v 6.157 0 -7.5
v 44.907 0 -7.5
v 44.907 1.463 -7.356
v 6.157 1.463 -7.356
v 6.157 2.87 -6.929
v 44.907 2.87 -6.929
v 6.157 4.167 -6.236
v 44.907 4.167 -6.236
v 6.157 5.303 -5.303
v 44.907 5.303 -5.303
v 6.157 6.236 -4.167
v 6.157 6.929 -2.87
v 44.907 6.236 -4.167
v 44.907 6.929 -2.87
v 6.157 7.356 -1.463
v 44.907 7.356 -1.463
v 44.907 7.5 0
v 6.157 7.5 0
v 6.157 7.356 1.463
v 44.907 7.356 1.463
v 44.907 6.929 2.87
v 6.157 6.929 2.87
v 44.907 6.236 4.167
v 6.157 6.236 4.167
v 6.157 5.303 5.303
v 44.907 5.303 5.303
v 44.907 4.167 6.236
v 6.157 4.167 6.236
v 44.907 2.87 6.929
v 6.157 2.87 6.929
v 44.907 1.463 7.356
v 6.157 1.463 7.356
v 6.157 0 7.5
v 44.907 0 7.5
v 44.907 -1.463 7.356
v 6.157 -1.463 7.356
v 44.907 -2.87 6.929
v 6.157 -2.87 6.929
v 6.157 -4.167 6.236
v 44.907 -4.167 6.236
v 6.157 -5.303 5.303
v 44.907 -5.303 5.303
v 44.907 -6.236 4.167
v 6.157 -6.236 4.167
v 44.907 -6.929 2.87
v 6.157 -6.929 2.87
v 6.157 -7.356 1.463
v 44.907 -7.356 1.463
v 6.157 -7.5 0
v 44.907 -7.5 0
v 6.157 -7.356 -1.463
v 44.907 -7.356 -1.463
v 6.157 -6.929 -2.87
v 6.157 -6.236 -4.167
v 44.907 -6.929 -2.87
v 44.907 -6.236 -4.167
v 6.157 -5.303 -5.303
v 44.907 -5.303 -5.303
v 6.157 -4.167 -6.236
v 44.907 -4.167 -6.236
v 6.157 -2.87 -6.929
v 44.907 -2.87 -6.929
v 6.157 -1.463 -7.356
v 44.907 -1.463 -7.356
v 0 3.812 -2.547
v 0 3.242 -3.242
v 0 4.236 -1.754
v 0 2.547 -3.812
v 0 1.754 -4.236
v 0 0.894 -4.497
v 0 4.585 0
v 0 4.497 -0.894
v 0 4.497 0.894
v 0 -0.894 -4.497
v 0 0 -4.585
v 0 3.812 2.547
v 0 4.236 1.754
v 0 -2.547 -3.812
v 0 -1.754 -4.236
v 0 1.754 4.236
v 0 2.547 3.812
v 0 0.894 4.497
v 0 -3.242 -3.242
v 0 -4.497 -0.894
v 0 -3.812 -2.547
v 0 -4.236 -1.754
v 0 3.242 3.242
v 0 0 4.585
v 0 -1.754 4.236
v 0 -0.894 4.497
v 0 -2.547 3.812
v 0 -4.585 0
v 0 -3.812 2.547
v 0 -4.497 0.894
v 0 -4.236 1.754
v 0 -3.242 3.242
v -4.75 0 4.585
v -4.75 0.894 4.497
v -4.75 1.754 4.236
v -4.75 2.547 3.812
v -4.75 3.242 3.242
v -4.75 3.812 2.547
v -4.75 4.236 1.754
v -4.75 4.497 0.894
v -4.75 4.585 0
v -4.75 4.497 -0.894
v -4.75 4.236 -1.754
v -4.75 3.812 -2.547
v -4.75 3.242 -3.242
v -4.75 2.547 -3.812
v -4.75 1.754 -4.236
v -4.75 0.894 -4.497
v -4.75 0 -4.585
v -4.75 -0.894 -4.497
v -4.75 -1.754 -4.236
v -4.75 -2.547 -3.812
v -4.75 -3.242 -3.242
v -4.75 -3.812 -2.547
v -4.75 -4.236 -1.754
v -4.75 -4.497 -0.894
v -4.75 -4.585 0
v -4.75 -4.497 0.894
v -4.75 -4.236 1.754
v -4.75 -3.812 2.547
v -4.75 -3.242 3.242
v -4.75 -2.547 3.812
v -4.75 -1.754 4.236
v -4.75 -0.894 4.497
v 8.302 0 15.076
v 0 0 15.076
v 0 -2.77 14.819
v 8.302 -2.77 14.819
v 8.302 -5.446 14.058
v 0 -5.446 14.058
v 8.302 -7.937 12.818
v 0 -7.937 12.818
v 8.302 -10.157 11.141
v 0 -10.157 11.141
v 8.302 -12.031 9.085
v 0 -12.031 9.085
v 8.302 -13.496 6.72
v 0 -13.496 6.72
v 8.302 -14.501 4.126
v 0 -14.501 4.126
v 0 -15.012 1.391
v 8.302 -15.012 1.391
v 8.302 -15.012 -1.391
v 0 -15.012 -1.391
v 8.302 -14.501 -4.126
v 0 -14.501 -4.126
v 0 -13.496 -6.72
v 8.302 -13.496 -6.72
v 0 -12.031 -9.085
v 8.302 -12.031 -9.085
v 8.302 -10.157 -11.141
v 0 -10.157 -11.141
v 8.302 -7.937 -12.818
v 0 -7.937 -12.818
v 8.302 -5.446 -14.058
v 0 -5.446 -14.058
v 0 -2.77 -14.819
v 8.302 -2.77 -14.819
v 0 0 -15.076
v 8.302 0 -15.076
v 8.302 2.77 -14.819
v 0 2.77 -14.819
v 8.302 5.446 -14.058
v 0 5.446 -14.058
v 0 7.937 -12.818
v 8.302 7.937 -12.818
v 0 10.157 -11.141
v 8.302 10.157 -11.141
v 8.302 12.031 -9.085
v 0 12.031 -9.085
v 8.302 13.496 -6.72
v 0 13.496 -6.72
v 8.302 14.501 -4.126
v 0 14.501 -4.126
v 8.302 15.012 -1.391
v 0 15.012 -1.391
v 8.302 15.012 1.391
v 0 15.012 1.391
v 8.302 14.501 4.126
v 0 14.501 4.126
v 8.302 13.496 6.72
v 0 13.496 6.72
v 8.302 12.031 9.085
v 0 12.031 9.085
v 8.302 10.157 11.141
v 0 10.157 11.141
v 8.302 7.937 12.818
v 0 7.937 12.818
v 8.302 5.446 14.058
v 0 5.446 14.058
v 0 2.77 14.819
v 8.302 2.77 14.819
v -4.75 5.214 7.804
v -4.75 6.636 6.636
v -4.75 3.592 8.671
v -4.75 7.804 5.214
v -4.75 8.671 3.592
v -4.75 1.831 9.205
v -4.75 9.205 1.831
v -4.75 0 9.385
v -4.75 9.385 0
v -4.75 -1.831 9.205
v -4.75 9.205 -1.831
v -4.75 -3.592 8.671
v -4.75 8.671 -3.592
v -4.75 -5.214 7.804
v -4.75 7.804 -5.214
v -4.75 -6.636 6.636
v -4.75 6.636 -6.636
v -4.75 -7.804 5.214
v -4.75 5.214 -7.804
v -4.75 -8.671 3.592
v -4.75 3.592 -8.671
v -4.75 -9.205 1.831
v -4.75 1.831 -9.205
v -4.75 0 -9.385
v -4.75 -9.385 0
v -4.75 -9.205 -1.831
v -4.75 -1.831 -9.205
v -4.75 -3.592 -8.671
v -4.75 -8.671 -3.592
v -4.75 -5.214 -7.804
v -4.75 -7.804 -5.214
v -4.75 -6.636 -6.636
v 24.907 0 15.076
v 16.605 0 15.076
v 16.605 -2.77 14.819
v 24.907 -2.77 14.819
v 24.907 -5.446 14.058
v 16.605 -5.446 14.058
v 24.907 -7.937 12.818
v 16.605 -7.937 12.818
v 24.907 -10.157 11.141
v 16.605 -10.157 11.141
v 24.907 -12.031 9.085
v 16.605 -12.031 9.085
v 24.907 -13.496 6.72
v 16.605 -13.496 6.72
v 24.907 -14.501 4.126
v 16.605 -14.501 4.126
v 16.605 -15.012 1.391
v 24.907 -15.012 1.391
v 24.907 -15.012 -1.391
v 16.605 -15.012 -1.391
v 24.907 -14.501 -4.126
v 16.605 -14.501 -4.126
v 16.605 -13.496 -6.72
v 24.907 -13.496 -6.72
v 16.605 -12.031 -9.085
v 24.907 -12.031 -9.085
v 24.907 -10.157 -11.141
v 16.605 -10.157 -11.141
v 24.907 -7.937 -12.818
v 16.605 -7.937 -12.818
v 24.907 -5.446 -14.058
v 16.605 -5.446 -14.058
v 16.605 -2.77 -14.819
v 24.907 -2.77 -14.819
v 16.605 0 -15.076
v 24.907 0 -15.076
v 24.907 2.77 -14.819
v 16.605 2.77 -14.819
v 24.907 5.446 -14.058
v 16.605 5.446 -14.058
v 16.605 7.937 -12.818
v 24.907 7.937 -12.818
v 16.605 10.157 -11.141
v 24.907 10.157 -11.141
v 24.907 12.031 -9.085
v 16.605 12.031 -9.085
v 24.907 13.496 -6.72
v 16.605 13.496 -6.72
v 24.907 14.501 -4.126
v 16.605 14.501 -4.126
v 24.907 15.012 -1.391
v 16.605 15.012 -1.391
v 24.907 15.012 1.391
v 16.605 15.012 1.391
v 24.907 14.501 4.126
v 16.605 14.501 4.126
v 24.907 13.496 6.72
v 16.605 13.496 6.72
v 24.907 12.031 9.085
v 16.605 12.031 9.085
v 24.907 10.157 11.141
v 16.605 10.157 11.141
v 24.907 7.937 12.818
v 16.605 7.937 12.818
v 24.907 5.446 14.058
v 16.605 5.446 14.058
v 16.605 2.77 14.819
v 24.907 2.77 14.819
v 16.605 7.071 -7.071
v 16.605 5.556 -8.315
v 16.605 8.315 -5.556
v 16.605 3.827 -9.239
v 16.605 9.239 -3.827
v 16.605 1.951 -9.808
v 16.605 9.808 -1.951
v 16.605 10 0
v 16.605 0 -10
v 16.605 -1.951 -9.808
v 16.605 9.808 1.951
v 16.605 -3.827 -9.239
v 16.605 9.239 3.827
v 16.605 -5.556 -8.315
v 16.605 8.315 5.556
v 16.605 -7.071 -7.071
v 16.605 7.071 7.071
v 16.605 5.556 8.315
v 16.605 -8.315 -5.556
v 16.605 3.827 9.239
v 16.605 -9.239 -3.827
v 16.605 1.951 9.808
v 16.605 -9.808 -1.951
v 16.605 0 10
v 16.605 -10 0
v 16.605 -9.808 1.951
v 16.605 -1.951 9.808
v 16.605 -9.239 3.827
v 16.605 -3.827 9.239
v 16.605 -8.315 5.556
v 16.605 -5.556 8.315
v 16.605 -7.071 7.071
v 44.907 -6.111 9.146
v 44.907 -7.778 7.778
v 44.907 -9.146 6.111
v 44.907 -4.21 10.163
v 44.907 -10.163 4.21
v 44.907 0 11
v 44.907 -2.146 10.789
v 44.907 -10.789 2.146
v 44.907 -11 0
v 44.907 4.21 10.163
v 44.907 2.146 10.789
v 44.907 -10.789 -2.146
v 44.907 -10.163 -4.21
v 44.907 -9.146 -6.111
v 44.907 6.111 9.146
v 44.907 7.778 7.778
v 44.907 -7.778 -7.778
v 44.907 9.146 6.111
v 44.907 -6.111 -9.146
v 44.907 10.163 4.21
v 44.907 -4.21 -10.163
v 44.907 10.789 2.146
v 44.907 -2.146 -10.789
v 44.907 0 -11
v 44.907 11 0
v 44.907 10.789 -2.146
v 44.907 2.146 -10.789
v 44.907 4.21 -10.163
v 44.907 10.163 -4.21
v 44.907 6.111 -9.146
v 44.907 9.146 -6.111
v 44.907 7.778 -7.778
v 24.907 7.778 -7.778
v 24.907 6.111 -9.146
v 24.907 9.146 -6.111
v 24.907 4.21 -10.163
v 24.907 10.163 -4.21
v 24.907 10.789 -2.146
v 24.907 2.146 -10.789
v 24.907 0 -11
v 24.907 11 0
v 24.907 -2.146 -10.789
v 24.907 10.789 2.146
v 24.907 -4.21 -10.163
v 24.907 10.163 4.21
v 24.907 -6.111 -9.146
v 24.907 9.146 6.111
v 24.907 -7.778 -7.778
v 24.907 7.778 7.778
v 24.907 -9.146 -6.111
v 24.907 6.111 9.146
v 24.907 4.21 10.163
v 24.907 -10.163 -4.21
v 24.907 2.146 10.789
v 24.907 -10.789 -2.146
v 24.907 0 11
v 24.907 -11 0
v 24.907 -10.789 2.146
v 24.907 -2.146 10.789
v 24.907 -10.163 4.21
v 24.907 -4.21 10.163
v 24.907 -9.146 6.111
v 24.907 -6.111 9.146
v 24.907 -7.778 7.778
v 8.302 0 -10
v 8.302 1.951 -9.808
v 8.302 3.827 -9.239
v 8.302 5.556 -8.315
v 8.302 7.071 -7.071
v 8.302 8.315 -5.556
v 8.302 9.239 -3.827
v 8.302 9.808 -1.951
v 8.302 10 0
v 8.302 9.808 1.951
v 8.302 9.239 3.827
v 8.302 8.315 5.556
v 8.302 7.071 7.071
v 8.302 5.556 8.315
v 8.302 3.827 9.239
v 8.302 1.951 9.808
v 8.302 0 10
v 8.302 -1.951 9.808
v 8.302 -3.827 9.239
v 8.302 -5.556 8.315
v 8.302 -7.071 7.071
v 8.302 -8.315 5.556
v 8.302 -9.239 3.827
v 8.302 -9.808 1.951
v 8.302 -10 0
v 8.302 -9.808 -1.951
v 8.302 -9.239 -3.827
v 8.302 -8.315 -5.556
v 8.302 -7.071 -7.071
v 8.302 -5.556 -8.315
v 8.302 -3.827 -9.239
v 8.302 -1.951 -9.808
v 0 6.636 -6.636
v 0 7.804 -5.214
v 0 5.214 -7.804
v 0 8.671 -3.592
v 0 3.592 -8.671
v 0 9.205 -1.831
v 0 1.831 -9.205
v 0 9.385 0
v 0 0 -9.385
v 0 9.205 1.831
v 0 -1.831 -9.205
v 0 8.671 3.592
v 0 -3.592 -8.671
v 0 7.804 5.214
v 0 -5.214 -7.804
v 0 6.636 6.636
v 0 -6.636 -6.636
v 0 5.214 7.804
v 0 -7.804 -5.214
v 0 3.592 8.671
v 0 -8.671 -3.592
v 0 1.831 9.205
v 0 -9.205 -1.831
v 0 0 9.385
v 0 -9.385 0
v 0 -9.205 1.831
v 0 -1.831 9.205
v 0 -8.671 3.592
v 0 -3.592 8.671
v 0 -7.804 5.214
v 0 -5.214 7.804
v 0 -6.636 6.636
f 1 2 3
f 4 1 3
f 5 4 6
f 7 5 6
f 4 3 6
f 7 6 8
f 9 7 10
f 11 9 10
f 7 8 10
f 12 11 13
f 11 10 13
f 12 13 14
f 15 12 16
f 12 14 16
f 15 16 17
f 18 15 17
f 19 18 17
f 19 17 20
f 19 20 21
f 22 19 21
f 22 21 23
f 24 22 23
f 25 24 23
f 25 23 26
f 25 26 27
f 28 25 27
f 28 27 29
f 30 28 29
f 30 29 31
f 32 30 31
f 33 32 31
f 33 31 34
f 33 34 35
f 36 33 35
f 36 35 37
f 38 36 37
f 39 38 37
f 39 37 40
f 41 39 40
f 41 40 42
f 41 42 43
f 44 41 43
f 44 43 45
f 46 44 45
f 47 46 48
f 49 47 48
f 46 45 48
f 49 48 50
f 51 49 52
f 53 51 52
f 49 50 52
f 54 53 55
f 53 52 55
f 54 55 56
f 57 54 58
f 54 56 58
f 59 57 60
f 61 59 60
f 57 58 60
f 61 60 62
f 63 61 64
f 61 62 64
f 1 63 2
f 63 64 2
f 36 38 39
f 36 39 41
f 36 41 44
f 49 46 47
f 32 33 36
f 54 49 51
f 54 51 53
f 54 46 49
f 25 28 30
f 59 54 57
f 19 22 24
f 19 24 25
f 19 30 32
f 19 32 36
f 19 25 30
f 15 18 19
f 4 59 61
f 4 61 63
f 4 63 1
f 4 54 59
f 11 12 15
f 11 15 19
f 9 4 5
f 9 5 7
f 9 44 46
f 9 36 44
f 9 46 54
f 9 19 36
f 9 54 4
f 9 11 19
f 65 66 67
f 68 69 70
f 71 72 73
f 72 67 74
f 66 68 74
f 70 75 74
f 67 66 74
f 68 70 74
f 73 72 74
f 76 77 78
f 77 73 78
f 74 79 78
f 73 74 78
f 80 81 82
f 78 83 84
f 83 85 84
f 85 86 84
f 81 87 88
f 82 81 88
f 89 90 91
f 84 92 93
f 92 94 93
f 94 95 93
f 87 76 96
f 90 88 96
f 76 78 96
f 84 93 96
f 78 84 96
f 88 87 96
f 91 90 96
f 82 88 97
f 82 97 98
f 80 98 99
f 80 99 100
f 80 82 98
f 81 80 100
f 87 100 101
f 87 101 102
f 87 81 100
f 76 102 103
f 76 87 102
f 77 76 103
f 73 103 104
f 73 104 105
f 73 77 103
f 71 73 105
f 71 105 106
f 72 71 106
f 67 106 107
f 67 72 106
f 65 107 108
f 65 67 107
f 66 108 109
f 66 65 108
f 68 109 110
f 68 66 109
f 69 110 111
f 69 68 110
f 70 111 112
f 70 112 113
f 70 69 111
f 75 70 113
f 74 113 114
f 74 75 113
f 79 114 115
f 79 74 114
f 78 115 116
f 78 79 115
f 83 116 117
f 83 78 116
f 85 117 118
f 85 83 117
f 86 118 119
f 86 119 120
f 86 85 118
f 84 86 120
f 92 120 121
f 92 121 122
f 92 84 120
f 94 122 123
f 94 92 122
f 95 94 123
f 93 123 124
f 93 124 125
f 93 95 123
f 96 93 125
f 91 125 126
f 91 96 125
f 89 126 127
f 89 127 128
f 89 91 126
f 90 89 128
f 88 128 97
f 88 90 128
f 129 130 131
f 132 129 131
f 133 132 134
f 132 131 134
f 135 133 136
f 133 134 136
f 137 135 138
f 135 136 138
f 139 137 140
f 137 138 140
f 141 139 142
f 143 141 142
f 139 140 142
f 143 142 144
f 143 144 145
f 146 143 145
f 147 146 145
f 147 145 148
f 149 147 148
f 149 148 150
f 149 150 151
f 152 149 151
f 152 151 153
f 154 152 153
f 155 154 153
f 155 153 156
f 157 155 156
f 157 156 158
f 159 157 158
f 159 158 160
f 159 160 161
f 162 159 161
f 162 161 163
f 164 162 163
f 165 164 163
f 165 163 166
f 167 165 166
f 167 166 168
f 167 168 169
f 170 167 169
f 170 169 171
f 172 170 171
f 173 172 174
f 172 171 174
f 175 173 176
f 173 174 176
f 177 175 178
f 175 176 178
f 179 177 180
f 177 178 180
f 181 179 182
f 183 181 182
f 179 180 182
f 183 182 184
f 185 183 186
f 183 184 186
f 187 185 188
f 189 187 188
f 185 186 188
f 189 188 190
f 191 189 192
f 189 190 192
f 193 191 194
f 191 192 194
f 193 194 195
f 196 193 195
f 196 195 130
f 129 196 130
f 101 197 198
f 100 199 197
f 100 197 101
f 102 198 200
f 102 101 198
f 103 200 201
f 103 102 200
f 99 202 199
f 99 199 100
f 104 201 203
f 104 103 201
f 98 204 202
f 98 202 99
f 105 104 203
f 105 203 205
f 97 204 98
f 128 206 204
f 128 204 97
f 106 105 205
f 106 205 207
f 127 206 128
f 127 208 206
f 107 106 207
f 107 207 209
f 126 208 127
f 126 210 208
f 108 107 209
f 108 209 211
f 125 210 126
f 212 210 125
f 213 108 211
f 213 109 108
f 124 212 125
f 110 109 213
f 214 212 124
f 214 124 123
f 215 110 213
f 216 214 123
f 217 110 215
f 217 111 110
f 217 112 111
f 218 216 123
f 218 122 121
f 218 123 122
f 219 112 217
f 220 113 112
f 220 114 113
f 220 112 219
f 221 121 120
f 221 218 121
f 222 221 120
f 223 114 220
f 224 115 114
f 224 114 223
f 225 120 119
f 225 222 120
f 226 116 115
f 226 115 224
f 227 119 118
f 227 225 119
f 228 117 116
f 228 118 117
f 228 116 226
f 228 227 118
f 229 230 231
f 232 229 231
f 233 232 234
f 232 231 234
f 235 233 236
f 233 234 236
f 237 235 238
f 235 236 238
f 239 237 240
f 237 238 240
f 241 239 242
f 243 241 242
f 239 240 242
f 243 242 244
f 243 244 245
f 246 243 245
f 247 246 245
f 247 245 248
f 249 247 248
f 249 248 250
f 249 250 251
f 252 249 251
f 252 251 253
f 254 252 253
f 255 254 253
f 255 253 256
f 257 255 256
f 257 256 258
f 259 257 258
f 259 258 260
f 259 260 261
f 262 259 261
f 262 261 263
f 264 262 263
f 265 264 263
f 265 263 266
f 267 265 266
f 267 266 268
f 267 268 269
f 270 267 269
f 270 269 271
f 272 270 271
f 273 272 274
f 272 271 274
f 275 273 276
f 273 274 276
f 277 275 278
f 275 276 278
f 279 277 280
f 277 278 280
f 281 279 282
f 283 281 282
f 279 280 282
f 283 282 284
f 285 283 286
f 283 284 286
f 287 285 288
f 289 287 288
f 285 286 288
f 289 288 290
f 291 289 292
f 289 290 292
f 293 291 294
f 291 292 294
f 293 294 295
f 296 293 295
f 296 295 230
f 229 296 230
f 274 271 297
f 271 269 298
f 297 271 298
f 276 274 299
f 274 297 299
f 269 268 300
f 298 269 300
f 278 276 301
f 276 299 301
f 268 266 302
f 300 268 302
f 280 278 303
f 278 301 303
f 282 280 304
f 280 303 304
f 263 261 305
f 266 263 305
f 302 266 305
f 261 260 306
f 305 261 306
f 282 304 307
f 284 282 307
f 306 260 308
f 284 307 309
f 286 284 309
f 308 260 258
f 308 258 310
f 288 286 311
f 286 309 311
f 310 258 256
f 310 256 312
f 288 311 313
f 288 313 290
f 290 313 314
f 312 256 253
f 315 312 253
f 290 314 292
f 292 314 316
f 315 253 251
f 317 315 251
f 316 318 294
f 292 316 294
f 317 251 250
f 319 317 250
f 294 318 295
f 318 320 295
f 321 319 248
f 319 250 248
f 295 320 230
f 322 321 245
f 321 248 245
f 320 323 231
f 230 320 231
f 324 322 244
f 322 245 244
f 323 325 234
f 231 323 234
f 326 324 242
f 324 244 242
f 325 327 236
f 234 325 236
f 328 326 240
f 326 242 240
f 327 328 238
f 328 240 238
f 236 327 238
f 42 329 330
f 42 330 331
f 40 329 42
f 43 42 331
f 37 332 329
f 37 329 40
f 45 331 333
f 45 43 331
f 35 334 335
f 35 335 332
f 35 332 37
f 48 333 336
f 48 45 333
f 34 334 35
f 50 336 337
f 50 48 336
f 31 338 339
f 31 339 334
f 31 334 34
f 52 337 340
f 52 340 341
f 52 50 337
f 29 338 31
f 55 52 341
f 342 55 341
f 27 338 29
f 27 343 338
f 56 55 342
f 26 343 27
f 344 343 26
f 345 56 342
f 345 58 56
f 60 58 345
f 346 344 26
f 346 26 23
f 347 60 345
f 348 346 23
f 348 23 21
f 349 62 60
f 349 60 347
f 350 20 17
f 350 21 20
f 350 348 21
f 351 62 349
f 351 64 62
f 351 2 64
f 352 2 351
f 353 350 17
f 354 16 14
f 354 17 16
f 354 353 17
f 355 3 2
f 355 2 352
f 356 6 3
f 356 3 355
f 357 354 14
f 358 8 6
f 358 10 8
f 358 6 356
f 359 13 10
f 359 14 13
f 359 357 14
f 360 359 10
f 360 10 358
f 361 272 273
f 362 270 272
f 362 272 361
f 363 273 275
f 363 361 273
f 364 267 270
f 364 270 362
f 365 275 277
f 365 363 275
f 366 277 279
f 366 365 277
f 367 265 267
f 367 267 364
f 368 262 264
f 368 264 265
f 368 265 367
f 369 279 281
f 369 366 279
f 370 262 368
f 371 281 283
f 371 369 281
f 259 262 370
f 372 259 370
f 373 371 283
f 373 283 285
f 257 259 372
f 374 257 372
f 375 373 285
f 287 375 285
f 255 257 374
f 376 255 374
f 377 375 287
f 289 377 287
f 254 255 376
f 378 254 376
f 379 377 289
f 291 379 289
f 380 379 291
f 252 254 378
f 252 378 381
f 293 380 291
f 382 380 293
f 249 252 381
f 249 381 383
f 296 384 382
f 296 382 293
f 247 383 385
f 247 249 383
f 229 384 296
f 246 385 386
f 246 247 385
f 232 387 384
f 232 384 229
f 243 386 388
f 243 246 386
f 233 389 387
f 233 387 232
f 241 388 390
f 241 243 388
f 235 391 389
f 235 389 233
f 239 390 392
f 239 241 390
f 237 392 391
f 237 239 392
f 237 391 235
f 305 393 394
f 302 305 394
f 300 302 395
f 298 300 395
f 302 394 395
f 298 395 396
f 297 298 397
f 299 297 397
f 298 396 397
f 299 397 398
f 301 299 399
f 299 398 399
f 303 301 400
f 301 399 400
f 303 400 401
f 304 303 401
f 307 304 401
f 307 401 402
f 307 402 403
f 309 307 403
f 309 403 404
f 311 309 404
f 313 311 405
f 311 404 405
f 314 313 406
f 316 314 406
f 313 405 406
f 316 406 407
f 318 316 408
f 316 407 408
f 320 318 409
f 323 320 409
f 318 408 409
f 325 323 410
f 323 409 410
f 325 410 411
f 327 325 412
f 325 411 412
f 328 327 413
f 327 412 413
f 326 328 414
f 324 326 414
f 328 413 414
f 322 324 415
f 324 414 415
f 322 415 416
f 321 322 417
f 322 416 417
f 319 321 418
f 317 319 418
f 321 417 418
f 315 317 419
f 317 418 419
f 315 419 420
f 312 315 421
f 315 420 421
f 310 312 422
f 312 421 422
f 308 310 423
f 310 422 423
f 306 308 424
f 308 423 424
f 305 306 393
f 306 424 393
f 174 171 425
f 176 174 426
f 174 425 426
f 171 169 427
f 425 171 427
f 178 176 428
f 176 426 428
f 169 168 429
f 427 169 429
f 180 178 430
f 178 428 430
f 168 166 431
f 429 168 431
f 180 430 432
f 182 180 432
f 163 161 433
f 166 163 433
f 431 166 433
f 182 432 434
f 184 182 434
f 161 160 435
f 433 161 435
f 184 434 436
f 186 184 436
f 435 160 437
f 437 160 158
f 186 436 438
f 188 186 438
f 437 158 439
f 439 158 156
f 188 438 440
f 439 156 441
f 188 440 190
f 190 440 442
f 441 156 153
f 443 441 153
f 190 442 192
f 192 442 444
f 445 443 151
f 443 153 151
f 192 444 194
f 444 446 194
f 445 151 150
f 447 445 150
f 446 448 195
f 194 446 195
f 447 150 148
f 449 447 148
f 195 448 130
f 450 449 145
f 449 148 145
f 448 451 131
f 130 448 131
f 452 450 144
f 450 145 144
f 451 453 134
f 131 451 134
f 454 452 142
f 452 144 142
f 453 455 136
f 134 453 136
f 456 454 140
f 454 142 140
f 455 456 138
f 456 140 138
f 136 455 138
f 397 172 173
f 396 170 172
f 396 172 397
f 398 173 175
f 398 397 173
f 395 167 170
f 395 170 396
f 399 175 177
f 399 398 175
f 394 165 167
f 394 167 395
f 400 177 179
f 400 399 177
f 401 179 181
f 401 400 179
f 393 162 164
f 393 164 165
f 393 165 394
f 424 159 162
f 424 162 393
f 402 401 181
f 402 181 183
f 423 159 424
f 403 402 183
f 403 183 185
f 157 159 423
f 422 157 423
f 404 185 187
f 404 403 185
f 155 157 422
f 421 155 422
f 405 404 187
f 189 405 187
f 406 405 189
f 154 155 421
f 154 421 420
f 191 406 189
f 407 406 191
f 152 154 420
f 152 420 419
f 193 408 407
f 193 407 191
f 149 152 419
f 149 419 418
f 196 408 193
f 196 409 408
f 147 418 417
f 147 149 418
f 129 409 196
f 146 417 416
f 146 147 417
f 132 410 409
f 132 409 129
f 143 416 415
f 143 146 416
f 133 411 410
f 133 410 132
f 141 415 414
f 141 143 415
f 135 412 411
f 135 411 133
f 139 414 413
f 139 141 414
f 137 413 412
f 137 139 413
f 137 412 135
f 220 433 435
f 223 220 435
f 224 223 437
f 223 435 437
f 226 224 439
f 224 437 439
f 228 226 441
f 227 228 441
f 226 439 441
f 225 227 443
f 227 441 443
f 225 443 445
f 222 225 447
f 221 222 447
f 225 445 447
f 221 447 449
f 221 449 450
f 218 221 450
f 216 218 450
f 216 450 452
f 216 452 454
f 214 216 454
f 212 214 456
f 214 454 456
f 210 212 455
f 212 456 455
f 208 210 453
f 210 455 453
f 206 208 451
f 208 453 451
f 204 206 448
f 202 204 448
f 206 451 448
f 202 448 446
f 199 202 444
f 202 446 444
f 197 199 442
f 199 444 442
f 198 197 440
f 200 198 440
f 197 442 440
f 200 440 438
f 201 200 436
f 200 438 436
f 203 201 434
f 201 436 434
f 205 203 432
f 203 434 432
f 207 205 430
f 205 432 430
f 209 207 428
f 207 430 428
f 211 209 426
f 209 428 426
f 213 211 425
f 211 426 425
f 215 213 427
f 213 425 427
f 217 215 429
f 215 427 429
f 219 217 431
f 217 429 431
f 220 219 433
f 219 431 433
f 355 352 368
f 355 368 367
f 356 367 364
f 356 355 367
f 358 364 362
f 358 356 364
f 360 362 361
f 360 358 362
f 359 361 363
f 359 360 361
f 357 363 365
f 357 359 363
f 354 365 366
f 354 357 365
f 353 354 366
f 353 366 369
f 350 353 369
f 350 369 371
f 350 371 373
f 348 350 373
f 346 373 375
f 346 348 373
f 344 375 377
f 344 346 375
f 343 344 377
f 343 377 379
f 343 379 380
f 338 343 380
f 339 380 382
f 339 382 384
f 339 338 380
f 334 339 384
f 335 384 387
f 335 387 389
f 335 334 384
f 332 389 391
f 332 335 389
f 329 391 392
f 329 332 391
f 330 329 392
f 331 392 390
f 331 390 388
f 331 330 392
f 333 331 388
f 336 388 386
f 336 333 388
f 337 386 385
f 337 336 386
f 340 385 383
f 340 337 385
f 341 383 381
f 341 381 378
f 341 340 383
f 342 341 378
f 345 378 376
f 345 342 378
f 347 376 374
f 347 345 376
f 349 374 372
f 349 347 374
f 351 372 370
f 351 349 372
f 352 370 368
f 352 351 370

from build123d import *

# Parameters (mm, degrees)
SKETCH1_R           = 15.07617
BOSS_EXTRUDE1_DEPTH = 24.9071592
SKETCH2_R           = 9.3853
SKETCH2_R_2         = 4.5847
BOSS_EXTRUDE2_DEPTH = 4.7498
SKETCH3_R           = 7.5
CUT_EXTRUDE1_DEPTH  = 18.75
BOSS_EXTRUDE3_START = 20
SKETCH4_R           = 11
SKETCH4_R_2         = 7.5
BOSS_EXTRUDE3_DEPTH = 20
CUT_EXTRUDE4_START  = -8.3023864
SKETCH5_R           = 15.07617
SKETCH5_R_2         = 10
CUT_EXTRUDE4_DEPTH  = 8.3023864


with BuildPart() as part:
    # Sketch1 → Boss-Extrude1 (new body)
    with BuildSketch(Plane(origin=(0, 0, 0), x_dir=(0, 0, -1), z_dir=(1, 0, 0))):
        with Locations(Location((0, 0, 0), (0, 0, 180))):
            Circle(SKETCH1_R)
    extrude(amount=BOSS_EXTRUDE1_DEPTH)

    # Sketch2 → Boss-Extrude2 (add)
    with BuildSketch(Plane.ZY):
        with Locations(Location((0, 0, 0), (0, 0, 180))):
            Circle(SKETCH2_R)
        Circle(SKETCH2_R_2, mode=Mode.SUBTRACT)
    extrude(amount=BOSS_EXTRUDE2_DEPTH)

    # Sketch3 → Cut-Extrude1 (cut)
    with BuildSketch(Plane(origin=(24.9071592, 0, 0), x_dir=(0, 0, -1), z_dir=(1, 0, 0))):
        Circle(SKETCH3_R)
    extrude(amount=-CUT_EXTRUDE1_DEPTH, mode=Mode.SUBTRACT)

    # Sketch4 → Boss-Extrude3 (add)
    with BuildSketch(Plane(origin=(24.9071592, 0, 0), x_dir=(0, 0, -1), z_dir=(1, 0, 0)).offset(BOSS_EXTRUDE3_START)):
        Circle(SKETCH4_R)
        Circle(SKETCH4_R_2, mode=Mode.SUBTRACT)
    extrude(amount=-BOSS_EXTRUDE3_DEPTH)

    # Sketch5 → Cut-Extrude4 (cut)
    with BuildSketch(Plane(origin=(16.6047728, 0, 0), x_dir=(0, 0, -1), z_dir=(1, 0, 0)).offset(CUT_EXTRUDE4_START)):
        with Locations(Location((0, 0, 0), (0, 0, 180))):
            Circle(SKETCH5_R)
        Circle(SKETCH5_R_2, mode=Mode.SUBTRACT)
    extrude(amount=CUT_EXTRUDE4_DEPTH, mode=Mode.SUBTRACT)


solid = part.part
